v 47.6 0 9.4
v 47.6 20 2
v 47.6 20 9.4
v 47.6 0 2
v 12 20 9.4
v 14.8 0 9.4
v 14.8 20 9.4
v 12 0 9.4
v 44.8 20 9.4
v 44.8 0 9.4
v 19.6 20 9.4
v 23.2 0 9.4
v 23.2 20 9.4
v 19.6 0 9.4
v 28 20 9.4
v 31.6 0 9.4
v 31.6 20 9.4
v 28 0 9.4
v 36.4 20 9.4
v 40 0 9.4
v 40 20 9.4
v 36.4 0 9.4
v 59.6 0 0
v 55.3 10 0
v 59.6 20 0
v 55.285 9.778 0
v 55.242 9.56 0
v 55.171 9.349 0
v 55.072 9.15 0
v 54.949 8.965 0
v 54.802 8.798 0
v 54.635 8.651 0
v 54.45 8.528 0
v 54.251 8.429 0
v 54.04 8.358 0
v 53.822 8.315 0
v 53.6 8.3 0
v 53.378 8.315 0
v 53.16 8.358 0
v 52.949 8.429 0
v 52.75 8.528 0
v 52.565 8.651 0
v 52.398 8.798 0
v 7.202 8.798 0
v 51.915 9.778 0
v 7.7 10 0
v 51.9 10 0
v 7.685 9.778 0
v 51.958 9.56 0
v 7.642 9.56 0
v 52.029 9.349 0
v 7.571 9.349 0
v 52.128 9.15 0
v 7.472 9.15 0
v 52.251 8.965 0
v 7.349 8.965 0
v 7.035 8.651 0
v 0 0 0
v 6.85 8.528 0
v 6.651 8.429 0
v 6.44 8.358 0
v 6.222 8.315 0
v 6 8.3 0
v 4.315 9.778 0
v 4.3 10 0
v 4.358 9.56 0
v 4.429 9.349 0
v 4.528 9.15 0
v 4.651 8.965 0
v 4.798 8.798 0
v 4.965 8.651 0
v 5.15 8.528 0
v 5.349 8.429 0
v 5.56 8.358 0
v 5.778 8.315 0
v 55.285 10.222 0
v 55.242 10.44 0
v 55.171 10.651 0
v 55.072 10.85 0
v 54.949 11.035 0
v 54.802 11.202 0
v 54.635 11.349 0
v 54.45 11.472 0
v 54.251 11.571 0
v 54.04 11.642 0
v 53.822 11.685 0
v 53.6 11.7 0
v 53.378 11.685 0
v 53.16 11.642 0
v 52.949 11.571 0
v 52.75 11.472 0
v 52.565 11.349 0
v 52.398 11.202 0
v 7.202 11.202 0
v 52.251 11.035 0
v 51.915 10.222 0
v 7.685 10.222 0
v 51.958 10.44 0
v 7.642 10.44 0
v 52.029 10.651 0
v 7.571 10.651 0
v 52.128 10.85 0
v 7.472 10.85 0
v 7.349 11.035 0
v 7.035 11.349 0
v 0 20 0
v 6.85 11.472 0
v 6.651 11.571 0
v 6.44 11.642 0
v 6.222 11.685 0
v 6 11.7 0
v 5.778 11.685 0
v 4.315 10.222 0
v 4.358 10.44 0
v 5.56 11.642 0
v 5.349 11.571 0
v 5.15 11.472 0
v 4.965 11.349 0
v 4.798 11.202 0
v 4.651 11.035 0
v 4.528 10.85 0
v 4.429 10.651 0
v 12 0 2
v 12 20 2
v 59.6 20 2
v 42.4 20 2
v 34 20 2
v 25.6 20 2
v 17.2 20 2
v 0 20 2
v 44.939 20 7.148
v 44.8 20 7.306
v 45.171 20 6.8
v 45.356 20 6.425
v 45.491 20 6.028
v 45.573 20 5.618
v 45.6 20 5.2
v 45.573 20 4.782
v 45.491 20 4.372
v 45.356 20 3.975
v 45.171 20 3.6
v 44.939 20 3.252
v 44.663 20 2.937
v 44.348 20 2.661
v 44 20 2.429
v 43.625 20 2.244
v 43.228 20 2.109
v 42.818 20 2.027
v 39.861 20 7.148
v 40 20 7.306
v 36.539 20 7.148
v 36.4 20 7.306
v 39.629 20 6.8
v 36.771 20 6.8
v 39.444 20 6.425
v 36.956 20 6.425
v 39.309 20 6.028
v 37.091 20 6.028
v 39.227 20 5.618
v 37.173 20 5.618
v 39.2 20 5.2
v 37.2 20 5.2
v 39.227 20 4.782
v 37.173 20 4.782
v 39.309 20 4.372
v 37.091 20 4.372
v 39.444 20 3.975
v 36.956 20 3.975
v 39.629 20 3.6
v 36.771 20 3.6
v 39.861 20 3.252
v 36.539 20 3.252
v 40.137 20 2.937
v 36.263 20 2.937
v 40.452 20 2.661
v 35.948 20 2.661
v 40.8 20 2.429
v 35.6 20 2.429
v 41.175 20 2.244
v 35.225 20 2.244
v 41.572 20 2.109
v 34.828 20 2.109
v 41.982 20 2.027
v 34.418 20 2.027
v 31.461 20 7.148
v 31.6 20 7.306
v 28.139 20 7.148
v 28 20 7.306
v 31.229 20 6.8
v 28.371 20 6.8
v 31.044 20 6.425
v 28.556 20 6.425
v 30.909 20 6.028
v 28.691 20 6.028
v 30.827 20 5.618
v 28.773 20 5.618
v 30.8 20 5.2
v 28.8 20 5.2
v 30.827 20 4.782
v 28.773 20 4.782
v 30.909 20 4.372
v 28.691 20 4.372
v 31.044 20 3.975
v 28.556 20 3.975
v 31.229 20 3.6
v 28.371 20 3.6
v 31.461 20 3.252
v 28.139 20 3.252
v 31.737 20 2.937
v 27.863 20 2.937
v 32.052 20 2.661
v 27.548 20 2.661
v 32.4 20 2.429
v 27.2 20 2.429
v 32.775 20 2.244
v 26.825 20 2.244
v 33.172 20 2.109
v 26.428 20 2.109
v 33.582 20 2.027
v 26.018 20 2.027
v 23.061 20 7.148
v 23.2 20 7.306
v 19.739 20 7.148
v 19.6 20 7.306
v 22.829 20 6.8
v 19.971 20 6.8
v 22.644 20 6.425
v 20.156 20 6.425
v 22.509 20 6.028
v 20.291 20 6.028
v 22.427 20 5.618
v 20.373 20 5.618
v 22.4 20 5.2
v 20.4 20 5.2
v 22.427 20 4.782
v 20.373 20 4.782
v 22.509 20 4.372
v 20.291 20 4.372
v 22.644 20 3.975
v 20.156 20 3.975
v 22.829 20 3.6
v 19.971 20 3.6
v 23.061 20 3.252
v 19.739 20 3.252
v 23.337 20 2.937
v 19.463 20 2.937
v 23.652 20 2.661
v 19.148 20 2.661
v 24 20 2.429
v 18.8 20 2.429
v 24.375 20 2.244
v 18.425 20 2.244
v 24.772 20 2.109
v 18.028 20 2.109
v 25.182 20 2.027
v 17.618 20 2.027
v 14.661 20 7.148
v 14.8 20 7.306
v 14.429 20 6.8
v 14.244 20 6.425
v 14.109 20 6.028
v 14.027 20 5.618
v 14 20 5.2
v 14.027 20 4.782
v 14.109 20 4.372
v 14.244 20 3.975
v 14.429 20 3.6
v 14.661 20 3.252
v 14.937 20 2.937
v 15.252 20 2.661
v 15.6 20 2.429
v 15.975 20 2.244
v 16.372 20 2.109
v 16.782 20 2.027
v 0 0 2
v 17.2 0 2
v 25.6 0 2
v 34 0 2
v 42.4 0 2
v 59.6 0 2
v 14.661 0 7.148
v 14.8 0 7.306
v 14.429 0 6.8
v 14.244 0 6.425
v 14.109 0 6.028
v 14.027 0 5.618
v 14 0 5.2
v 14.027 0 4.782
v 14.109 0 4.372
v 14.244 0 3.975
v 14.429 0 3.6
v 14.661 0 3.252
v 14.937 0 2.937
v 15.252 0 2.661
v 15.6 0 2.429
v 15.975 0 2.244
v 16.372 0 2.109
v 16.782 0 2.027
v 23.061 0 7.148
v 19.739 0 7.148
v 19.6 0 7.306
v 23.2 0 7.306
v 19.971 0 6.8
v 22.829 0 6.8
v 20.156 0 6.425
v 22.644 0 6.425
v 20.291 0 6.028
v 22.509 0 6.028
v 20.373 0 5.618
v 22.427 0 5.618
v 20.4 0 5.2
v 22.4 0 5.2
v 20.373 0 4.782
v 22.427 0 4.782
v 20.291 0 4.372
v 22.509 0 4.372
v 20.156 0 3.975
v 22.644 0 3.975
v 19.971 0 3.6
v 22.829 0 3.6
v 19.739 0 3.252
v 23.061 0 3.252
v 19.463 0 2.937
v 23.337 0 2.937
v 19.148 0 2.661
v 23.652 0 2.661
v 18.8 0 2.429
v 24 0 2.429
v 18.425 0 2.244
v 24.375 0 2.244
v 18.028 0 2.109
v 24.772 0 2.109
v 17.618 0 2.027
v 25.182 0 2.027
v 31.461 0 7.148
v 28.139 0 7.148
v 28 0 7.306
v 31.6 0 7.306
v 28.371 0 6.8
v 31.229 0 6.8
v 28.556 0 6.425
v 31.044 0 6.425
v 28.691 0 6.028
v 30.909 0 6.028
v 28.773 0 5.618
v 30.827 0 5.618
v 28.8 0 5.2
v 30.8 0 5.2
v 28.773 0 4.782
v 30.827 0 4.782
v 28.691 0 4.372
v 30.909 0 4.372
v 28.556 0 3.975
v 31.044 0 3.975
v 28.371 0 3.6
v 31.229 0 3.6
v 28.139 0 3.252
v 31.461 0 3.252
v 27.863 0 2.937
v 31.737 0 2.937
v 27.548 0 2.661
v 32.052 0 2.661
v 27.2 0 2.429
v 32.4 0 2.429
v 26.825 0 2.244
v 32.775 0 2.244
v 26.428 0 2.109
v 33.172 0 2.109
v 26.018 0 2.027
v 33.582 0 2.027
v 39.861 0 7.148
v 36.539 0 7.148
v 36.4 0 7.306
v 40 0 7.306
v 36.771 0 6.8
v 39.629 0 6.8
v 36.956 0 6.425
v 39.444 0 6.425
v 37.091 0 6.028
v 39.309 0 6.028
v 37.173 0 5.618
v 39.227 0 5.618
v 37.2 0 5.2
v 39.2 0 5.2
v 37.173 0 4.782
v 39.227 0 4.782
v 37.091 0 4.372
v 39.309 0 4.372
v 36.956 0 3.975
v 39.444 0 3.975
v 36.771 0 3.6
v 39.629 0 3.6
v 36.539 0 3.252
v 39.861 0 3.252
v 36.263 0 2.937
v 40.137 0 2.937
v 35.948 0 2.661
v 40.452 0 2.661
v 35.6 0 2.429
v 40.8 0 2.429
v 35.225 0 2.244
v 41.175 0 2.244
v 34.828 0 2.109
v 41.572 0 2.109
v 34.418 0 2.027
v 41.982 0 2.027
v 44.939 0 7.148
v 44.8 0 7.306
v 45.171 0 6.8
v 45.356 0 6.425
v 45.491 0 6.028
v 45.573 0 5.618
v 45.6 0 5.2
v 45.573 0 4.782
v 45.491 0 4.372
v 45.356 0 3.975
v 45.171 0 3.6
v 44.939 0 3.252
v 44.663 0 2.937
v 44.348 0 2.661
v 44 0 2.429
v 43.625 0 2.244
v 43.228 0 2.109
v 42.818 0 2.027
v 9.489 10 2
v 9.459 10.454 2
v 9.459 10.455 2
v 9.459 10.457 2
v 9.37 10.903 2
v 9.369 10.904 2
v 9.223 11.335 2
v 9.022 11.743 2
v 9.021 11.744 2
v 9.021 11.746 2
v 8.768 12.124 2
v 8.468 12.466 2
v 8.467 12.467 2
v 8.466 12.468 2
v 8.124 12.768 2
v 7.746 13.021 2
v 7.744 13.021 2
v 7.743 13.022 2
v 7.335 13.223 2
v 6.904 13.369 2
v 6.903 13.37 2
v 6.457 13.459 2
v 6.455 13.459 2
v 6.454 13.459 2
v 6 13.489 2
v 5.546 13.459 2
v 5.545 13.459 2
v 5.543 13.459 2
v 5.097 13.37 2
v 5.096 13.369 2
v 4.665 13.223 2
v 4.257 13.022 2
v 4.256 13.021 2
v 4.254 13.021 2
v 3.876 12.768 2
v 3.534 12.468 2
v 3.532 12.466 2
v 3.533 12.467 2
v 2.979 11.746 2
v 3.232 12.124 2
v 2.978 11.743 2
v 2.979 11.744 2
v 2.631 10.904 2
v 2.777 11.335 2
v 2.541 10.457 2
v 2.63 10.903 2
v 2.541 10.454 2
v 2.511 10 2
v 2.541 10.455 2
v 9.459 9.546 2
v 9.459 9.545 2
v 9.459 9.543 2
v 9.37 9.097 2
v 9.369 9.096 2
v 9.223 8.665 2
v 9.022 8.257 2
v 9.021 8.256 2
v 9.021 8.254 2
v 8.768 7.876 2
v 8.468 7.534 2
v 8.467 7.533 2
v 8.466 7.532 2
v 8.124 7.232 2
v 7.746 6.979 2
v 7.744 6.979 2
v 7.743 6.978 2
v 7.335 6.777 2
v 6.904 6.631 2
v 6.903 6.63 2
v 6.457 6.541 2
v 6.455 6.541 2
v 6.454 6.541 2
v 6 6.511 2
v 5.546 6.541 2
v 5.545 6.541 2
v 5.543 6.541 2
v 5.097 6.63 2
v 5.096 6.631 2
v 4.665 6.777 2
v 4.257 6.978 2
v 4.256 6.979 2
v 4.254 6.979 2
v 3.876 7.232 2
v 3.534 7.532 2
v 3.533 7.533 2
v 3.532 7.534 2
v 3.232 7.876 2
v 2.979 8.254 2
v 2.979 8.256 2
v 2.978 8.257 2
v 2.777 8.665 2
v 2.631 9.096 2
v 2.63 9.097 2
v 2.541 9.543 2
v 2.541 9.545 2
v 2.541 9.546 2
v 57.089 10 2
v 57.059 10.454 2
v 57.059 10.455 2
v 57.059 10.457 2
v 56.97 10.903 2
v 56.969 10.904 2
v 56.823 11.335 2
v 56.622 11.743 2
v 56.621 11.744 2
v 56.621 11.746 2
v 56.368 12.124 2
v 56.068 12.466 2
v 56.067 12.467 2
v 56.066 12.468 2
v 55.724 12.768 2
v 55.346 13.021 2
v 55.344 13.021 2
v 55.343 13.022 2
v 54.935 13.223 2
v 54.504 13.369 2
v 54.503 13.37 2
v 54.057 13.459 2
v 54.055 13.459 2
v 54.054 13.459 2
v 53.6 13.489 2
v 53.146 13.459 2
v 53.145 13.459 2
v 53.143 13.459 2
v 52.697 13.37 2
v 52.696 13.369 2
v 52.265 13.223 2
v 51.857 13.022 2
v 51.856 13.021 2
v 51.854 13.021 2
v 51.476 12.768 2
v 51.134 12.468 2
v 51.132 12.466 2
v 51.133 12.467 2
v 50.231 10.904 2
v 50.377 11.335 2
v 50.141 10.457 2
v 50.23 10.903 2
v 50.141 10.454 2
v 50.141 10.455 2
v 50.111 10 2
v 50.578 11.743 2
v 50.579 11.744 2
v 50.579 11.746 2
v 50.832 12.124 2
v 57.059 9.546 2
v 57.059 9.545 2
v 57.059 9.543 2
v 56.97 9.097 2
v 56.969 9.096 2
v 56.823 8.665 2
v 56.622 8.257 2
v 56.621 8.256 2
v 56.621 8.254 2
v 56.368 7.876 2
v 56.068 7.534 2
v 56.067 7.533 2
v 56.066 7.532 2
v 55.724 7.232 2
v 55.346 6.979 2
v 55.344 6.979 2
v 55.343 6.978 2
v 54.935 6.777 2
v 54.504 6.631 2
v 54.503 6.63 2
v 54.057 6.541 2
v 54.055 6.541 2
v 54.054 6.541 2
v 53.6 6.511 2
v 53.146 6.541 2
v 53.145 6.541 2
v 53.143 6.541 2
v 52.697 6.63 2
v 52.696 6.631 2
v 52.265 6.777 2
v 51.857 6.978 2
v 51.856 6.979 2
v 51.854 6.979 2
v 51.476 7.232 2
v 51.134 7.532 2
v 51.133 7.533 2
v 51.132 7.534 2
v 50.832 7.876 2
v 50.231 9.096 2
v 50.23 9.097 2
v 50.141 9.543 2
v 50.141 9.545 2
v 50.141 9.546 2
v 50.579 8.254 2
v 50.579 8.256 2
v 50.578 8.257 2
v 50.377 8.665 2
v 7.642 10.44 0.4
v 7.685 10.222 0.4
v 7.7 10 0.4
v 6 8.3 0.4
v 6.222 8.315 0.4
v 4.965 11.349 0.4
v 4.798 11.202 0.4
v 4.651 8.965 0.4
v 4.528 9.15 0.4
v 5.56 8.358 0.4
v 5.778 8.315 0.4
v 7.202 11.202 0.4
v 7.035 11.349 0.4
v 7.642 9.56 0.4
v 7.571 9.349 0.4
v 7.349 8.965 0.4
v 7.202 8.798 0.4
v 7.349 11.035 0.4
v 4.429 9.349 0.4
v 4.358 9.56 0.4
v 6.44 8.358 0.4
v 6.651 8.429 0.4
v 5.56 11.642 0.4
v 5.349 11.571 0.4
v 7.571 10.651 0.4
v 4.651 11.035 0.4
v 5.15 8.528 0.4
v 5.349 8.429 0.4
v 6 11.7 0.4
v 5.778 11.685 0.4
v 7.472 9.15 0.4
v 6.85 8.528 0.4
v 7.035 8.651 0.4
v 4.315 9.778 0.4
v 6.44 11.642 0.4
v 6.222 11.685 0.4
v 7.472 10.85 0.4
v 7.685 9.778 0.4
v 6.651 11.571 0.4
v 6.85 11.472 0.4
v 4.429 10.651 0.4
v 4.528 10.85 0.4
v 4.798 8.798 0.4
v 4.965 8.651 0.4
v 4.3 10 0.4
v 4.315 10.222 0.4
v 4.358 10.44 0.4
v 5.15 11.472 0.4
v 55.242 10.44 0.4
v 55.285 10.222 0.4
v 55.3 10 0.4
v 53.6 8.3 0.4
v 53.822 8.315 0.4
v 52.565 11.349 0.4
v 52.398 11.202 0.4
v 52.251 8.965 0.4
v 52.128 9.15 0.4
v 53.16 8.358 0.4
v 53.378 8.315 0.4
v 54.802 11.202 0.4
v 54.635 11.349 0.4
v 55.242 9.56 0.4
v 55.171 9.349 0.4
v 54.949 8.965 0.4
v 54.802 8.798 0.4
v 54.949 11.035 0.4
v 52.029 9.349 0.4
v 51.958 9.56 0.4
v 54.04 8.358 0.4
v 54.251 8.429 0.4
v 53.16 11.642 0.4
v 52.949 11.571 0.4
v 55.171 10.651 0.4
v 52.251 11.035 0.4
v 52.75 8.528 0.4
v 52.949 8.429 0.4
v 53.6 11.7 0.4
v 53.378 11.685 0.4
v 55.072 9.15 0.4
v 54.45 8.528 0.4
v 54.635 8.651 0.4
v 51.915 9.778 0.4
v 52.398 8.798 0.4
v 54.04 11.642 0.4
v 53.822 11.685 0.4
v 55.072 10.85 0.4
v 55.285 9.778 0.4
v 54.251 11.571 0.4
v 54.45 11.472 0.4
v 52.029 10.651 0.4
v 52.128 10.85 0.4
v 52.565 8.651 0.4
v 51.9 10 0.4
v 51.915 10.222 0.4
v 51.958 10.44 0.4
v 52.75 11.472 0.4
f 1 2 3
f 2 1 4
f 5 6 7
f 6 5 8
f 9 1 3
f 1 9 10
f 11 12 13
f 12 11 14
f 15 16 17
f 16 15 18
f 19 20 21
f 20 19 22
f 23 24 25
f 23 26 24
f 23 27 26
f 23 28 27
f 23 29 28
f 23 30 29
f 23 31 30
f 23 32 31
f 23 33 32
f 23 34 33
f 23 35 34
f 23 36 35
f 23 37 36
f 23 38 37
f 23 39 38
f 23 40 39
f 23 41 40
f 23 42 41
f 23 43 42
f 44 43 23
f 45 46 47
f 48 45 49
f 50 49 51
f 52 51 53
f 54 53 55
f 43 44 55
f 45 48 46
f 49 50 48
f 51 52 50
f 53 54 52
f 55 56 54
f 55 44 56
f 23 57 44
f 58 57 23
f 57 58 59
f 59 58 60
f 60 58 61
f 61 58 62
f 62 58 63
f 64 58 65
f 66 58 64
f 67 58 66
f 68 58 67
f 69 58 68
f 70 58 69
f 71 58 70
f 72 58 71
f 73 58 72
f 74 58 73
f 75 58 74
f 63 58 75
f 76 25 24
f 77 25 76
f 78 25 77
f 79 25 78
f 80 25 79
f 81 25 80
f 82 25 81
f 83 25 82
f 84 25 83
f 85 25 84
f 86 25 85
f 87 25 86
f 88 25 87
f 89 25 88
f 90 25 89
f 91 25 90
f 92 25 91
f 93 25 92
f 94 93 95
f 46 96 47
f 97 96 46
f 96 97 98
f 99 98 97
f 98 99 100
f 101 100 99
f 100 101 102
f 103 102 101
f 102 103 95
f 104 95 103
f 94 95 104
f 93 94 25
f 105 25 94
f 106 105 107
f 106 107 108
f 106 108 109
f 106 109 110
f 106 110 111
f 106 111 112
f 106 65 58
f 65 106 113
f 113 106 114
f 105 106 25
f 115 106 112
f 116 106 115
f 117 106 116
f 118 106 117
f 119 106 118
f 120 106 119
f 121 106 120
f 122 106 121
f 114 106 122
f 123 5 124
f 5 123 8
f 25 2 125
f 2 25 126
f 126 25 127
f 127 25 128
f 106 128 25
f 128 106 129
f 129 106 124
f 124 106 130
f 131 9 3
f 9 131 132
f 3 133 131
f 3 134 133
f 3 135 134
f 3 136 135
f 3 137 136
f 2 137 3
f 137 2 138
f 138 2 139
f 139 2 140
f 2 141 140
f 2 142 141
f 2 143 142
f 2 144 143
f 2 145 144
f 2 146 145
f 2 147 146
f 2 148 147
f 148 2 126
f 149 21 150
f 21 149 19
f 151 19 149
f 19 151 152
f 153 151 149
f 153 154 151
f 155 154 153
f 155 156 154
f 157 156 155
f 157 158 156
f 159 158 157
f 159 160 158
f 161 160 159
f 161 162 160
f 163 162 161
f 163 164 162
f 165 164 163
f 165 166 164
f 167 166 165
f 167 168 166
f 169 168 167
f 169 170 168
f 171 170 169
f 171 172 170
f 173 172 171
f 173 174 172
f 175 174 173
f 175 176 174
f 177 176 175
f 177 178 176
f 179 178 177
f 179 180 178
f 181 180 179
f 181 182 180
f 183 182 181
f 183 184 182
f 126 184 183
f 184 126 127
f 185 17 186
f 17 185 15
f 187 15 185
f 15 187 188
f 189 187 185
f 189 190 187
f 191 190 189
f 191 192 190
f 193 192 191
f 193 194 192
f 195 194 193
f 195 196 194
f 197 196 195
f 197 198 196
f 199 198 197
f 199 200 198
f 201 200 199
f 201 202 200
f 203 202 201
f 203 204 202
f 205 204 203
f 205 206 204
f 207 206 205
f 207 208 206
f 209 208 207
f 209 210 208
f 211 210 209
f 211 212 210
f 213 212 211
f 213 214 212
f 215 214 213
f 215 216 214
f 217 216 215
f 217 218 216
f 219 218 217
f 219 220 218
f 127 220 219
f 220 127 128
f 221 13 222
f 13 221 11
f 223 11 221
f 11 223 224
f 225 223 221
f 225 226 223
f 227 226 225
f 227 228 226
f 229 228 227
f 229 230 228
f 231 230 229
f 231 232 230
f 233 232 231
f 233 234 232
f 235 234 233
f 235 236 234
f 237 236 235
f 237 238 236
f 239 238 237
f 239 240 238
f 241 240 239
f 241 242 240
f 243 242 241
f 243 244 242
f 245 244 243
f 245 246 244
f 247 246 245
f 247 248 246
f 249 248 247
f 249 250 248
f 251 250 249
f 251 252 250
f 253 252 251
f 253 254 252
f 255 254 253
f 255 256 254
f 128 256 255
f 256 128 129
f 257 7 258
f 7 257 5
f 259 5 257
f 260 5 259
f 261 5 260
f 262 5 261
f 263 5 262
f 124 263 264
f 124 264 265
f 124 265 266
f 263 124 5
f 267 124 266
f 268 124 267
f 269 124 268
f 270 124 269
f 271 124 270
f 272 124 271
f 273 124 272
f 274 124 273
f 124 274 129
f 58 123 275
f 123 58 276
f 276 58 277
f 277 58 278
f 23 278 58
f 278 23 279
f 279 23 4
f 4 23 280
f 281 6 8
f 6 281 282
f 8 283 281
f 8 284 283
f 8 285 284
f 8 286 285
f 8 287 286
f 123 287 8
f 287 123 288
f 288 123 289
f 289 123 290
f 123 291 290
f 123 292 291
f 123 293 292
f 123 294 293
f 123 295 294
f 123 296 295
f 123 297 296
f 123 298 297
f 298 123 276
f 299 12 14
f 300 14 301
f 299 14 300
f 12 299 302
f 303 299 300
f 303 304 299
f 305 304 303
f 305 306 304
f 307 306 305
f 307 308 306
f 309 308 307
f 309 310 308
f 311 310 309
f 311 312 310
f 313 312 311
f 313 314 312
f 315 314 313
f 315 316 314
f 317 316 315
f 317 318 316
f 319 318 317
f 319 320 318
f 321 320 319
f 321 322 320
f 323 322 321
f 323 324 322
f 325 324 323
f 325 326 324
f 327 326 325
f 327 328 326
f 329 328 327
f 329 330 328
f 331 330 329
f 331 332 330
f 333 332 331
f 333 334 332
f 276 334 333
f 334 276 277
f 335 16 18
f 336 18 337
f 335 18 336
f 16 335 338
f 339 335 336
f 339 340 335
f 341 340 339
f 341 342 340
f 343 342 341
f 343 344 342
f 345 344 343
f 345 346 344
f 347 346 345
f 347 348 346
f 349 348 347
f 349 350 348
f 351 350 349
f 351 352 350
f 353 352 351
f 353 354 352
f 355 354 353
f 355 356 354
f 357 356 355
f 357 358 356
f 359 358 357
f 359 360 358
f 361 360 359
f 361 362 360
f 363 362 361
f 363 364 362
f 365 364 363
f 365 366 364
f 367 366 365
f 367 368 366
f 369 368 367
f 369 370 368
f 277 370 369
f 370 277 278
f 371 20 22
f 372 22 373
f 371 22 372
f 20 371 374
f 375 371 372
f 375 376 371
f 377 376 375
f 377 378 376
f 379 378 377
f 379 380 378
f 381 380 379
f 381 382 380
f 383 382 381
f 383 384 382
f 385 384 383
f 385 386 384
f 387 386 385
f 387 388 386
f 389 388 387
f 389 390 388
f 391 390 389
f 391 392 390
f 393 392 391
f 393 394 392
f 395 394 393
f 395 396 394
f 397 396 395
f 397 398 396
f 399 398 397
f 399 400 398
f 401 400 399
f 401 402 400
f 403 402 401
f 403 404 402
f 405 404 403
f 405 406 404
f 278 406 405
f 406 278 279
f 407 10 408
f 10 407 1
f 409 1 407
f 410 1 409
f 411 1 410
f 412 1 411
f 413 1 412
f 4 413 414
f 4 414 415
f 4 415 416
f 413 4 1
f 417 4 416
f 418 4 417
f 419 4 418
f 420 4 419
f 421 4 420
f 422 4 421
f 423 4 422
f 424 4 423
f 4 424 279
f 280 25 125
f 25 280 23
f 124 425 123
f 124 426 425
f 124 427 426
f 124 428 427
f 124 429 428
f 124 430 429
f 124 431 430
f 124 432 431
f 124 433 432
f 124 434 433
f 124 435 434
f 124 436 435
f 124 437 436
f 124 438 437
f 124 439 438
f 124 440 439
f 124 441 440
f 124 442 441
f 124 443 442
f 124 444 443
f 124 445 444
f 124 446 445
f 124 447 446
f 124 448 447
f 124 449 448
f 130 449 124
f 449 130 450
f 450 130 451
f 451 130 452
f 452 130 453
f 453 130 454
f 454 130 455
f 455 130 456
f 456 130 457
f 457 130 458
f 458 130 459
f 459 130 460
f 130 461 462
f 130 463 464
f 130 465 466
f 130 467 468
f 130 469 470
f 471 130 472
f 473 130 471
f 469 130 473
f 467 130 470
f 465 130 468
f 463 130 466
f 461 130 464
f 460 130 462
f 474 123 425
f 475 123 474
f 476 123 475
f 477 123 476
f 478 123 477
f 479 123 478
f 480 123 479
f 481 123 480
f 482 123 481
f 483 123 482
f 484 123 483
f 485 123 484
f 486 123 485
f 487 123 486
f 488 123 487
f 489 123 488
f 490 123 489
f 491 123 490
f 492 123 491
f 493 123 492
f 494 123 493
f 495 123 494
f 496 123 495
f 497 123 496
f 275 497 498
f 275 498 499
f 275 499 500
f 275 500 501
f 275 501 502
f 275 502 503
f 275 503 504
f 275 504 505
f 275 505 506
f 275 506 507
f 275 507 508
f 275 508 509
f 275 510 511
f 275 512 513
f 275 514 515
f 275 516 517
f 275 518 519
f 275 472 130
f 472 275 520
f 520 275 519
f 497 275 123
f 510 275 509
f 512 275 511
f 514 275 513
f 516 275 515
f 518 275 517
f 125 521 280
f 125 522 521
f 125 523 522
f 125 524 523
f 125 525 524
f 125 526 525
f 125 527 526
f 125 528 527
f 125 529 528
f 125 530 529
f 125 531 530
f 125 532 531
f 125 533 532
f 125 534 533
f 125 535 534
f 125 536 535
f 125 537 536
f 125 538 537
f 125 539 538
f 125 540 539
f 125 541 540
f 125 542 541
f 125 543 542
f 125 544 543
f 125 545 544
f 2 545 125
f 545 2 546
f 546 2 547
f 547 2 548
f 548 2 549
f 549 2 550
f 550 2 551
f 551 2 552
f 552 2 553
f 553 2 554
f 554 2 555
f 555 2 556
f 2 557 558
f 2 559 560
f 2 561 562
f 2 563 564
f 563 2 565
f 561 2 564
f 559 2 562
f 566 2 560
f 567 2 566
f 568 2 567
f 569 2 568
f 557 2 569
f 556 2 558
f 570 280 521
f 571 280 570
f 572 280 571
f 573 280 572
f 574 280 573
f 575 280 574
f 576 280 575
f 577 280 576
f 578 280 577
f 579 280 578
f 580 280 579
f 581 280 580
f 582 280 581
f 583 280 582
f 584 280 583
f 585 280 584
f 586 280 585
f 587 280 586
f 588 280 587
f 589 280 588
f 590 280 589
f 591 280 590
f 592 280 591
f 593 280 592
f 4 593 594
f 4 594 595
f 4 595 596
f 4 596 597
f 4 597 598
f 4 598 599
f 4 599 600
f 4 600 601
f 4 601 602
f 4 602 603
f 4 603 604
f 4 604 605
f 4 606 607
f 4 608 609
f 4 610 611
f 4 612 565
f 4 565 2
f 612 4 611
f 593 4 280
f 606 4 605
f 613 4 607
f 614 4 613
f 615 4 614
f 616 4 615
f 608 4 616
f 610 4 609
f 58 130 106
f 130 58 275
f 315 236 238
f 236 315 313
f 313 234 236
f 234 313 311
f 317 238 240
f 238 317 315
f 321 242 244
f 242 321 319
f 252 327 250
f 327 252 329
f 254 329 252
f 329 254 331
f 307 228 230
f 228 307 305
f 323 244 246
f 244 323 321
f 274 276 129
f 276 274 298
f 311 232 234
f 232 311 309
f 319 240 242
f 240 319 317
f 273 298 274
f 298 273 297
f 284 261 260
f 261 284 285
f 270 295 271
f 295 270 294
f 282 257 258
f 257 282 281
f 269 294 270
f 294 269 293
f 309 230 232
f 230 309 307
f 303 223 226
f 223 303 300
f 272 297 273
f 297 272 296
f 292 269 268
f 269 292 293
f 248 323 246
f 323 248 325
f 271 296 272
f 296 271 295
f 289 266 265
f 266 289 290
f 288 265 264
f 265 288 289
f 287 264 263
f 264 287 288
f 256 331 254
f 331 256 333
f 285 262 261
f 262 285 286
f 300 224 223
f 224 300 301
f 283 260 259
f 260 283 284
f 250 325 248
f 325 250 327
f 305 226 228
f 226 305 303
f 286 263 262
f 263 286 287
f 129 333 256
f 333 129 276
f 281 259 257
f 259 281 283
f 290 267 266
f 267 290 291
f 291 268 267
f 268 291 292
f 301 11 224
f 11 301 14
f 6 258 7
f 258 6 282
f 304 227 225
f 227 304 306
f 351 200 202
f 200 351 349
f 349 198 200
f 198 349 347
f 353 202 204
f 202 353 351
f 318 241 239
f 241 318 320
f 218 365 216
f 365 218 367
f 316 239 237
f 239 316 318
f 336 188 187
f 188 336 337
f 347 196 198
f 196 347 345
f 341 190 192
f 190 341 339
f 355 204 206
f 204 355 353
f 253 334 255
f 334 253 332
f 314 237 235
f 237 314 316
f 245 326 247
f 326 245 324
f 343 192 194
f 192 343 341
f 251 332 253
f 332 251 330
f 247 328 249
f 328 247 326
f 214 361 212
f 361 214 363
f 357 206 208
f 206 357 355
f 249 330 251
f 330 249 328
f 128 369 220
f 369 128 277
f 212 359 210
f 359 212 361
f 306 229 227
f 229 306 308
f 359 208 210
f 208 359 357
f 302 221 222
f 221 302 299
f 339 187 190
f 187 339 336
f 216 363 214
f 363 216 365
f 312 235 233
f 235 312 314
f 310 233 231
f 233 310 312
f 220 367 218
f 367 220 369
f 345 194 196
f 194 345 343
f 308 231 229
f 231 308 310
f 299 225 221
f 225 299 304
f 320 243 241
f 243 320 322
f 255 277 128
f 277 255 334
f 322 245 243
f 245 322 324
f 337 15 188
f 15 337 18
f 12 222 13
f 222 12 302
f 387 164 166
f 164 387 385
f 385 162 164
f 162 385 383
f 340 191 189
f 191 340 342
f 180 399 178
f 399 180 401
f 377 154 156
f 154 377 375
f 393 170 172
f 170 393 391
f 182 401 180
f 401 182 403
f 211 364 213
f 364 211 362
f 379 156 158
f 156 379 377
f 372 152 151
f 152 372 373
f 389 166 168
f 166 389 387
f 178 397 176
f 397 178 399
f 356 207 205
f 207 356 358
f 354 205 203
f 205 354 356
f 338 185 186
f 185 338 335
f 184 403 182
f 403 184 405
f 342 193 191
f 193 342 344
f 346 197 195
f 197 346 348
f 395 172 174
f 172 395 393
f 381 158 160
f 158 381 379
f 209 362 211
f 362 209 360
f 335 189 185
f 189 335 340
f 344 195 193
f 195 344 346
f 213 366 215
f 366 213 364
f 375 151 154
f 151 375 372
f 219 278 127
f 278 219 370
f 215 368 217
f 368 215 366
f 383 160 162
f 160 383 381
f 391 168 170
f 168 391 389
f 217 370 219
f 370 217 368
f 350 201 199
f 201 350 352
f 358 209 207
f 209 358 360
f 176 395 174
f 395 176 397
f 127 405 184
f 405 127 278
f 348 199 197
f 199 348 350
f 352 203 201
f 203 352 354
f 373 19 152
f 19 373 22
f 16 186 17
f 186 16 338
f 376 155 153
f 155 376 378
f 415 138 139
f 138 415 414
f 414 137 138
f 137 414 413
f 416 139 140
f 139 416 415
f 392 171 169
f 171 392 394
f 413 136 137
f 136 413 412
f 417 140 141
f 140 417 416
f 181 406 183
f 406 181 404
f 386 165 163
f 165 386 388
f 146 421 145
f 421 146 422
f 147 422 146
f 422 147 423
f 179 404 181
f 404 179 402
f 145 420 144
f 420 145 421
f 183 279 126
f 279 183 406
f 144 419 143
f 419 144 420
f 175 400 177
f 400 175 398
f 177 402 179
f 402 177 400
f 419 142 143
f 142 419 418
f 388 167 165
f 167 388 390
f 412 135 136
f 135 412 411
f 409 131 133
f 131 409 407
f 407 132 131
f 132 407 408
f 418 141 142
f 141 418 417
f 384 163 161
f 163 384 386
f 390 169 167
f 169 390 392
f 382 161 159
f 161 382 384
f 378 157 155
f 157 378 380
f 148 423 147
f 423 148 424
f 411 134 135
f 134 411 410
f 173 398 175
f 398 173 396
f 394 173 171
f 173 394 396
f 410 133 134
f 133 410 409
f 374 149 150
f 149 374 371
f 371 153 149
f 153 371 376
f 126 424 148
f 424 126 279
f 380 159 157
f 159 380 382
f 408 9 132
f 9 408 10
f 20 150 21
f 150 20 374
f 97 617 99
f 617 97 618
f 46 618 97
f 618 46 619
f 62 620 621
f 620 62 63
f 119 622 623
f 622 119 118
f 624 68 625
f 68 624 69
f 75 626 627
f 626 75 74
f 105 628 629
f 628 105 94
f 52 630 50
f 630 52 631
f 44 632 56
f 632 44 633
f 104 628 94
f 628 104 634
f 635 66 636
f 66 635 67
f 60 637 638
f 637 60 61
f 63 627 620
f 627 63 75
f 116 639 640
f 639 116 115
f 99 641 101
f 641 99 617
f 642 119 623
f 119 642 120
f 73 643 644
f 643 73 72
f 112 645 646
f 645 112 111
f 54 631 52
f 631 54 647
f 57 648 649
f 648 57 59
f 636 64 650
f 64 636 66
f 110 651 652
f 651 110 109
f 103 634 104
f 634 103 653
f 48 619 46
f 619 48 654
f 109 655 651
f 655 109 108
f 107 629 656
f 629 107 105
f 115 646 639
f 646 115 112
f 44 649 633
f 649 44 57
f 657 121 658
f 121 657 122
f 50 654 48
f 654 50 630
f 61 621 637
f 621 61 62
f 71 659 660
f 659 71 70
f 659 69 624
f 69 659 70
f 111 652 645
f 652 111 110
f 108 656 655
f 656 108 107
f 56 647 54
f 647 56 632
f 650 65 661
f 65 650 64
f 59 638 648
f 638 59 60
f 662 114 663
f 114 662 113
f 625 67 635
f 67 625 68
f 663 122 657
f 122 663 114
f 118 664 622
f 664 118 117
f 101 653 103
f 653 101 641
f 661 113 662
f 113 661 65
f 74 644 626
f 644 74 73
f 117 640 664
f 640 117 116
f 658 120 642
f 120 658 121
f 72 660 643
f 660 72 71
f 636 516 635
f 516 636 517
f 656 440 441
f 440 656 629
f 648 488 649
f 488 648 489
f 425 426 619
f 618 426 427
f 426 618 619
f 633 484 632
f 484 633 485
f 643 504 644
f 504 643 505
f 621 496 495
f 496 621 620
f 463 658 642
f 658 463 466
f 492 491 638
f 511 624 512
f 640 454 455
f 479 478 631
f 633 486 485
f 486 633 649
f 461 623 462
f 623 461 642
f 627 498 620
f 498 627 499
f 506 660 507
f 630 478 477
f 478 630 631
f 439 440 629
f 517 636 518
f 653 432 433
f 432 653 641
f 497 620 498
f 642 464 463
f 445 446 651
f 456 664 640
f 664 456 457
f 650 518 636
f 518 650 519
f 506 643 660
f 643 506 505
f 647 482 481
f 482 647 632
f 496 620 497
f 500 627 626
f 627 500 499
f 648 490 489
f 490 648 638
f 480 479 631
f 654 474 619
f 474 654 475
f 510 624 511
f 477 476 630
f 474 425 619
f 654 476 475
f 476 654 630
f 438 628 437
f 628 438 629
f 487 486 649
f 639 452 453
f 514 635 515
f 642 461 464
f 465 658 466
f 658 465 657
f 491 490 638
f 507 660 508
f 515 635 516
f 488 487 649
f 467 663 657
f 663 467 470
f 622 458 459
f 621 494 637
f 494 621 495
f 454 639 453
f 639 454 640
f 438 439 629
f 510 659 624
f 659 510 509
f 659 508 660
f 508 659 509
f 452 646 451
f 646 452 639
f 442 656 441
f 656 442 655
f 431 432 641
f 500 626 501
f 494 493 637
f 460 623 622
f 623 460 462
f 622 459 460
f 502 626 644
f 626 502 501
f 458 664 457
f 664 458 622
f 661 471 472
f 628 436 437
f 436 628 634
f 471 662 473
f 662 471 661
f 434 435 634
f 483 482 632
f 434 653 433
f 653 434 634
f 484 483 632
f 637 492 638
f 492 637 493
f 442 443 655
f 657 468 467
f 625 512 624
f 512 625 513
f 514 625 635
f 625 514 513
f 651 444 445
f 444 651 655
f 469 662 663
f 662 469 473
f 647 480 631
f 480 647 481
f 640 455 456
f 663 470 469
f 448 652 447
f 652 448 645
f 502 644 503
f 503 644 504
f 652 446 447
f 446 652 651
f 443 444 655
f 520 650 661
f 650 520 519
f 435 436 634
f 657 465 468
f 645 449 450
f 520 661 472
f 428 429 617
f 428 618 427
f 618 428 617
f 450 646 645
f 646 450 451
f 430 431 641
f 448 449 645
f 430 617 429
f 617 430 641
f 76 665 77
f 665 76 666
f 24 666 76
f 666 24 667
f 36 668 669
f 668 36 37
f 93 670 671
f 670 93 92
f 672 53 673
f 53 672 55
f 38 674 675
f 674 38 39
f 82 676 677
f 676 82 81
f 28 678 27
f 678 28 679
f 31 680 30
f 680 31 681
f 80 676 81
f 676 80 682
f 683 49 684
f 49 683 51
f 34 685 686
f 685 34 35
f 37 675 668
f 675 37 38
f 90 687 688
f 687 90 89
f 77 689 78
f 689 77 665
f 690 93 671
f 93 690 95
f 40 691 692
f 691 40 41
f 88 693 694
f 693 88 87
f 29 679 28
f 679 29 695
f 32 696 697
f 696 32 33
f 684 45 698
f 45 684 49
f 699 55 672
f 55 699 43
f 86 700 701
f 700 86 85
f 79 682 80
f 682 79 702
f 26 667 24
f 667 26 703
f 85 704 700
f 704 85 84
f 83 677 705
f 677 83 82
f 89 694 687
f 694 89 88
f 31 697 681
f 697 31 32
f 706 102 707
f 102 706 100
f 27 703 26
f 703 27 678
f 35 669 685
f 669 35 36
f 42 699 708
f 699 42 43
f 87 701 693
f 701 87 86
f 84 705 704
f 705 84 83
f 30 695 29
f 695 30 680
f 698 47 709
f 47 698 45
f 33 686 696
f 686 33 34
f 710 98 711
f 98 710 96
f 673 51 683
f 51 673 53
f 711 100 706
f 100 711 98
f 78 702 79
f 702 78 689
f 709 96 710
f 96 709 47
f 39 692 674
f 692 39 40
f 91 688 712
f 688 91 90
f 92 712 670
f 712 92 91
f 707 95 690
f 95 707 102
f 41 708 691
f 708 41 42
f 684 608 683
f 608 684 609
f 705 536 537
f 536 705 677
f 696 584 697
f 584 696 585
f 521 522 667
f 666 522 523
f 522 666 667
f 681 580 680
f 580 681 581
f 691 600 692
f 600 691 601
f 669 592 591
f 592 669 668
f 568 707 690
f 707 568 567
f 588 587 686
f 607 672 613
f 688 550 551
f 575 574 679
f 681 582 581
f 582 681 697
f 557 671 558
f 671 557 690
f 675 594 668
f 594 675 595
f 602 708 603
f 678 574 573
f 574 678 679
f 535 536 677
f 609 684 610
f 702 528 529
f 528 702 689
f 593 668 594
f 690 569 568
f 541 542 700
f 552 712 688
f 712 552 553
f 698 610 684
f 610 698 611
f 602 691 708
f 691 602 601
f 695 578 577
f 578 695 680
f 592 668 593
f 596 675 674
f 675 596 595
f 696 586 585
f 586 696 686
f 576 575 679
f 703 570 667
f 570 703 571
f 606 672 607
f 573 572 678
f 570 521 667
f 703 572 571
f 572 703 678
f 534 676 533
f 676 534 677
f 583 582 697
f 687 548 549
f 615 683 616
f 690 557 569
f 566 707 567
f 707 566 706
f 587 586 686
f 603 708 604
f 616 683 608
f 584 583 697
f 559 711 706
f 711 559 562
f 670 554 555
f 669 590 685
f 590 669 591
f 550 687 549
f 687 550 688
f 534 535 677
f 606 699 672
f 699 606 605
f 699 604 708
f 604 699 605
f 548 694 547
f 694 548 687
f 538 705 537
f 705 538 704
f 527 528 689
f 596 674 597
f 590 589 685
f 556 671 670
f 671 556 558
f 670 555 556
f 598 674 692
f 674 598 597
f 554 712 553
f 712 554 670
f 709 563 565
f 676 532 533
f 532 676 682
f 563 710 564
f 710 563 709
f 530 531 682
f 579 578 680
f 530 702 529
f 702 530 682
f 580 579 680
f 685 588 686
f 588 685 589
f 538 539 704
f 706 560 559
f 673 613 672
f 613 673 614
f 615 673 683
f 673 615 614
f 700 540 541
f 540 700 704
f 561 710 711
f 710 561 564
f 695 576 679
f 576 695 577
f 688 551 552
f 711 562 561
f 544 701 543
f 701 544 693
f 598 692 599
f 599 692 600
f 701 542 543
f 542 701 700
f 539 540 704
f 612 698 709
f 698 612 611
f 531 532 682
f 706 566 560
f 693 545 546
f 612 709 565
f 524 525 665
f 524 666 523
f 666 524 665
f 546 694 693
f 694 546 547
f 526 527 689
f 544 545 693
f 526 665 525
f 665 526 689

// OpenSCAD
// Organizador de cables para pegar o atornillar bajo la mesa — Forja3D (MIT)
// Se imprime tal cual: la cara plana (la que va contra la mesa) apoyada en la cama. Sin soportes.

/* [Canales] */
// Número de cables
cables = 4; // [1:1:10]
// Diámetro de cada cable (mm)
diametro_cable = 6; // [3:0.5:12]
// Holgura del canal (mm)
holgura = 0.4; // [0.1:0.1:1]
// Ancho de la abertura para meter el cable (% del diámetro; ≥ 72 evita voladizos)
abertura = 75; // [40:5:90]

/* [Pieza] */
// Largo del organizador (mm)
largo = 20; // [10:1:60]
// Grosor mínimo de pared (mm)
pared = 2; // [1.2:0.2:4]
// Pestañas con agujeros para tornillo (además de cinta adhesiva)
con_tornillos = true;

/* [Hidden] */
$fn = 48;
d = diametro_cable + holgura;
paso = d + pared;
ancho_cuerpo = cables * paso + pared;
alto = pared + d + pared / 2;
pestana = con_tornillos ? 12 : 0;
ancho_total = ancho_cuerpo + 2 * pestana;

difference() {
  union() {
    // Cuerpo con los canales
    translate([pestana, 0, 0]) cube([ancho_cuerpo, largo, alto]);
    // Pestañas planas para los tornillos
    if (con_tornillos) cube([ancho_total, largo, pared]);
  }
  for (i = [0 : cables - 1]) {
    cx = pestana + pared + d / 2 + i * paso;
    // Canal del cable (el centro queda por debajo de la cara superior)
    translate([cx, -1, pared + d / 2]) rotate([-90, 0, 0]) cylinder(d = d, h = largo + 2);
    // Abertura superior para meter el cable a presión
    translate([cx - d * abertura / 200, -1, pared + d / 2]) cube([d * abertura / 100, largo + 2, alto]);
  }
  if (con_tornillos)
    for (x = [pestana / 2, ancho_total - pestana / 2])
      translate([x, largo / 2, 0]) {
        translate([0, 0, -1]) cylinder(d = 3.4, h = pared + 2);
        // Avellanado abierto hacia arriba (la cabeza del tornillo queda al ras)
        translate([0, 0, pared - 1.6]) cylinder(d1 = 3.4, d2 = 7, h = 1.61);
      }
}
